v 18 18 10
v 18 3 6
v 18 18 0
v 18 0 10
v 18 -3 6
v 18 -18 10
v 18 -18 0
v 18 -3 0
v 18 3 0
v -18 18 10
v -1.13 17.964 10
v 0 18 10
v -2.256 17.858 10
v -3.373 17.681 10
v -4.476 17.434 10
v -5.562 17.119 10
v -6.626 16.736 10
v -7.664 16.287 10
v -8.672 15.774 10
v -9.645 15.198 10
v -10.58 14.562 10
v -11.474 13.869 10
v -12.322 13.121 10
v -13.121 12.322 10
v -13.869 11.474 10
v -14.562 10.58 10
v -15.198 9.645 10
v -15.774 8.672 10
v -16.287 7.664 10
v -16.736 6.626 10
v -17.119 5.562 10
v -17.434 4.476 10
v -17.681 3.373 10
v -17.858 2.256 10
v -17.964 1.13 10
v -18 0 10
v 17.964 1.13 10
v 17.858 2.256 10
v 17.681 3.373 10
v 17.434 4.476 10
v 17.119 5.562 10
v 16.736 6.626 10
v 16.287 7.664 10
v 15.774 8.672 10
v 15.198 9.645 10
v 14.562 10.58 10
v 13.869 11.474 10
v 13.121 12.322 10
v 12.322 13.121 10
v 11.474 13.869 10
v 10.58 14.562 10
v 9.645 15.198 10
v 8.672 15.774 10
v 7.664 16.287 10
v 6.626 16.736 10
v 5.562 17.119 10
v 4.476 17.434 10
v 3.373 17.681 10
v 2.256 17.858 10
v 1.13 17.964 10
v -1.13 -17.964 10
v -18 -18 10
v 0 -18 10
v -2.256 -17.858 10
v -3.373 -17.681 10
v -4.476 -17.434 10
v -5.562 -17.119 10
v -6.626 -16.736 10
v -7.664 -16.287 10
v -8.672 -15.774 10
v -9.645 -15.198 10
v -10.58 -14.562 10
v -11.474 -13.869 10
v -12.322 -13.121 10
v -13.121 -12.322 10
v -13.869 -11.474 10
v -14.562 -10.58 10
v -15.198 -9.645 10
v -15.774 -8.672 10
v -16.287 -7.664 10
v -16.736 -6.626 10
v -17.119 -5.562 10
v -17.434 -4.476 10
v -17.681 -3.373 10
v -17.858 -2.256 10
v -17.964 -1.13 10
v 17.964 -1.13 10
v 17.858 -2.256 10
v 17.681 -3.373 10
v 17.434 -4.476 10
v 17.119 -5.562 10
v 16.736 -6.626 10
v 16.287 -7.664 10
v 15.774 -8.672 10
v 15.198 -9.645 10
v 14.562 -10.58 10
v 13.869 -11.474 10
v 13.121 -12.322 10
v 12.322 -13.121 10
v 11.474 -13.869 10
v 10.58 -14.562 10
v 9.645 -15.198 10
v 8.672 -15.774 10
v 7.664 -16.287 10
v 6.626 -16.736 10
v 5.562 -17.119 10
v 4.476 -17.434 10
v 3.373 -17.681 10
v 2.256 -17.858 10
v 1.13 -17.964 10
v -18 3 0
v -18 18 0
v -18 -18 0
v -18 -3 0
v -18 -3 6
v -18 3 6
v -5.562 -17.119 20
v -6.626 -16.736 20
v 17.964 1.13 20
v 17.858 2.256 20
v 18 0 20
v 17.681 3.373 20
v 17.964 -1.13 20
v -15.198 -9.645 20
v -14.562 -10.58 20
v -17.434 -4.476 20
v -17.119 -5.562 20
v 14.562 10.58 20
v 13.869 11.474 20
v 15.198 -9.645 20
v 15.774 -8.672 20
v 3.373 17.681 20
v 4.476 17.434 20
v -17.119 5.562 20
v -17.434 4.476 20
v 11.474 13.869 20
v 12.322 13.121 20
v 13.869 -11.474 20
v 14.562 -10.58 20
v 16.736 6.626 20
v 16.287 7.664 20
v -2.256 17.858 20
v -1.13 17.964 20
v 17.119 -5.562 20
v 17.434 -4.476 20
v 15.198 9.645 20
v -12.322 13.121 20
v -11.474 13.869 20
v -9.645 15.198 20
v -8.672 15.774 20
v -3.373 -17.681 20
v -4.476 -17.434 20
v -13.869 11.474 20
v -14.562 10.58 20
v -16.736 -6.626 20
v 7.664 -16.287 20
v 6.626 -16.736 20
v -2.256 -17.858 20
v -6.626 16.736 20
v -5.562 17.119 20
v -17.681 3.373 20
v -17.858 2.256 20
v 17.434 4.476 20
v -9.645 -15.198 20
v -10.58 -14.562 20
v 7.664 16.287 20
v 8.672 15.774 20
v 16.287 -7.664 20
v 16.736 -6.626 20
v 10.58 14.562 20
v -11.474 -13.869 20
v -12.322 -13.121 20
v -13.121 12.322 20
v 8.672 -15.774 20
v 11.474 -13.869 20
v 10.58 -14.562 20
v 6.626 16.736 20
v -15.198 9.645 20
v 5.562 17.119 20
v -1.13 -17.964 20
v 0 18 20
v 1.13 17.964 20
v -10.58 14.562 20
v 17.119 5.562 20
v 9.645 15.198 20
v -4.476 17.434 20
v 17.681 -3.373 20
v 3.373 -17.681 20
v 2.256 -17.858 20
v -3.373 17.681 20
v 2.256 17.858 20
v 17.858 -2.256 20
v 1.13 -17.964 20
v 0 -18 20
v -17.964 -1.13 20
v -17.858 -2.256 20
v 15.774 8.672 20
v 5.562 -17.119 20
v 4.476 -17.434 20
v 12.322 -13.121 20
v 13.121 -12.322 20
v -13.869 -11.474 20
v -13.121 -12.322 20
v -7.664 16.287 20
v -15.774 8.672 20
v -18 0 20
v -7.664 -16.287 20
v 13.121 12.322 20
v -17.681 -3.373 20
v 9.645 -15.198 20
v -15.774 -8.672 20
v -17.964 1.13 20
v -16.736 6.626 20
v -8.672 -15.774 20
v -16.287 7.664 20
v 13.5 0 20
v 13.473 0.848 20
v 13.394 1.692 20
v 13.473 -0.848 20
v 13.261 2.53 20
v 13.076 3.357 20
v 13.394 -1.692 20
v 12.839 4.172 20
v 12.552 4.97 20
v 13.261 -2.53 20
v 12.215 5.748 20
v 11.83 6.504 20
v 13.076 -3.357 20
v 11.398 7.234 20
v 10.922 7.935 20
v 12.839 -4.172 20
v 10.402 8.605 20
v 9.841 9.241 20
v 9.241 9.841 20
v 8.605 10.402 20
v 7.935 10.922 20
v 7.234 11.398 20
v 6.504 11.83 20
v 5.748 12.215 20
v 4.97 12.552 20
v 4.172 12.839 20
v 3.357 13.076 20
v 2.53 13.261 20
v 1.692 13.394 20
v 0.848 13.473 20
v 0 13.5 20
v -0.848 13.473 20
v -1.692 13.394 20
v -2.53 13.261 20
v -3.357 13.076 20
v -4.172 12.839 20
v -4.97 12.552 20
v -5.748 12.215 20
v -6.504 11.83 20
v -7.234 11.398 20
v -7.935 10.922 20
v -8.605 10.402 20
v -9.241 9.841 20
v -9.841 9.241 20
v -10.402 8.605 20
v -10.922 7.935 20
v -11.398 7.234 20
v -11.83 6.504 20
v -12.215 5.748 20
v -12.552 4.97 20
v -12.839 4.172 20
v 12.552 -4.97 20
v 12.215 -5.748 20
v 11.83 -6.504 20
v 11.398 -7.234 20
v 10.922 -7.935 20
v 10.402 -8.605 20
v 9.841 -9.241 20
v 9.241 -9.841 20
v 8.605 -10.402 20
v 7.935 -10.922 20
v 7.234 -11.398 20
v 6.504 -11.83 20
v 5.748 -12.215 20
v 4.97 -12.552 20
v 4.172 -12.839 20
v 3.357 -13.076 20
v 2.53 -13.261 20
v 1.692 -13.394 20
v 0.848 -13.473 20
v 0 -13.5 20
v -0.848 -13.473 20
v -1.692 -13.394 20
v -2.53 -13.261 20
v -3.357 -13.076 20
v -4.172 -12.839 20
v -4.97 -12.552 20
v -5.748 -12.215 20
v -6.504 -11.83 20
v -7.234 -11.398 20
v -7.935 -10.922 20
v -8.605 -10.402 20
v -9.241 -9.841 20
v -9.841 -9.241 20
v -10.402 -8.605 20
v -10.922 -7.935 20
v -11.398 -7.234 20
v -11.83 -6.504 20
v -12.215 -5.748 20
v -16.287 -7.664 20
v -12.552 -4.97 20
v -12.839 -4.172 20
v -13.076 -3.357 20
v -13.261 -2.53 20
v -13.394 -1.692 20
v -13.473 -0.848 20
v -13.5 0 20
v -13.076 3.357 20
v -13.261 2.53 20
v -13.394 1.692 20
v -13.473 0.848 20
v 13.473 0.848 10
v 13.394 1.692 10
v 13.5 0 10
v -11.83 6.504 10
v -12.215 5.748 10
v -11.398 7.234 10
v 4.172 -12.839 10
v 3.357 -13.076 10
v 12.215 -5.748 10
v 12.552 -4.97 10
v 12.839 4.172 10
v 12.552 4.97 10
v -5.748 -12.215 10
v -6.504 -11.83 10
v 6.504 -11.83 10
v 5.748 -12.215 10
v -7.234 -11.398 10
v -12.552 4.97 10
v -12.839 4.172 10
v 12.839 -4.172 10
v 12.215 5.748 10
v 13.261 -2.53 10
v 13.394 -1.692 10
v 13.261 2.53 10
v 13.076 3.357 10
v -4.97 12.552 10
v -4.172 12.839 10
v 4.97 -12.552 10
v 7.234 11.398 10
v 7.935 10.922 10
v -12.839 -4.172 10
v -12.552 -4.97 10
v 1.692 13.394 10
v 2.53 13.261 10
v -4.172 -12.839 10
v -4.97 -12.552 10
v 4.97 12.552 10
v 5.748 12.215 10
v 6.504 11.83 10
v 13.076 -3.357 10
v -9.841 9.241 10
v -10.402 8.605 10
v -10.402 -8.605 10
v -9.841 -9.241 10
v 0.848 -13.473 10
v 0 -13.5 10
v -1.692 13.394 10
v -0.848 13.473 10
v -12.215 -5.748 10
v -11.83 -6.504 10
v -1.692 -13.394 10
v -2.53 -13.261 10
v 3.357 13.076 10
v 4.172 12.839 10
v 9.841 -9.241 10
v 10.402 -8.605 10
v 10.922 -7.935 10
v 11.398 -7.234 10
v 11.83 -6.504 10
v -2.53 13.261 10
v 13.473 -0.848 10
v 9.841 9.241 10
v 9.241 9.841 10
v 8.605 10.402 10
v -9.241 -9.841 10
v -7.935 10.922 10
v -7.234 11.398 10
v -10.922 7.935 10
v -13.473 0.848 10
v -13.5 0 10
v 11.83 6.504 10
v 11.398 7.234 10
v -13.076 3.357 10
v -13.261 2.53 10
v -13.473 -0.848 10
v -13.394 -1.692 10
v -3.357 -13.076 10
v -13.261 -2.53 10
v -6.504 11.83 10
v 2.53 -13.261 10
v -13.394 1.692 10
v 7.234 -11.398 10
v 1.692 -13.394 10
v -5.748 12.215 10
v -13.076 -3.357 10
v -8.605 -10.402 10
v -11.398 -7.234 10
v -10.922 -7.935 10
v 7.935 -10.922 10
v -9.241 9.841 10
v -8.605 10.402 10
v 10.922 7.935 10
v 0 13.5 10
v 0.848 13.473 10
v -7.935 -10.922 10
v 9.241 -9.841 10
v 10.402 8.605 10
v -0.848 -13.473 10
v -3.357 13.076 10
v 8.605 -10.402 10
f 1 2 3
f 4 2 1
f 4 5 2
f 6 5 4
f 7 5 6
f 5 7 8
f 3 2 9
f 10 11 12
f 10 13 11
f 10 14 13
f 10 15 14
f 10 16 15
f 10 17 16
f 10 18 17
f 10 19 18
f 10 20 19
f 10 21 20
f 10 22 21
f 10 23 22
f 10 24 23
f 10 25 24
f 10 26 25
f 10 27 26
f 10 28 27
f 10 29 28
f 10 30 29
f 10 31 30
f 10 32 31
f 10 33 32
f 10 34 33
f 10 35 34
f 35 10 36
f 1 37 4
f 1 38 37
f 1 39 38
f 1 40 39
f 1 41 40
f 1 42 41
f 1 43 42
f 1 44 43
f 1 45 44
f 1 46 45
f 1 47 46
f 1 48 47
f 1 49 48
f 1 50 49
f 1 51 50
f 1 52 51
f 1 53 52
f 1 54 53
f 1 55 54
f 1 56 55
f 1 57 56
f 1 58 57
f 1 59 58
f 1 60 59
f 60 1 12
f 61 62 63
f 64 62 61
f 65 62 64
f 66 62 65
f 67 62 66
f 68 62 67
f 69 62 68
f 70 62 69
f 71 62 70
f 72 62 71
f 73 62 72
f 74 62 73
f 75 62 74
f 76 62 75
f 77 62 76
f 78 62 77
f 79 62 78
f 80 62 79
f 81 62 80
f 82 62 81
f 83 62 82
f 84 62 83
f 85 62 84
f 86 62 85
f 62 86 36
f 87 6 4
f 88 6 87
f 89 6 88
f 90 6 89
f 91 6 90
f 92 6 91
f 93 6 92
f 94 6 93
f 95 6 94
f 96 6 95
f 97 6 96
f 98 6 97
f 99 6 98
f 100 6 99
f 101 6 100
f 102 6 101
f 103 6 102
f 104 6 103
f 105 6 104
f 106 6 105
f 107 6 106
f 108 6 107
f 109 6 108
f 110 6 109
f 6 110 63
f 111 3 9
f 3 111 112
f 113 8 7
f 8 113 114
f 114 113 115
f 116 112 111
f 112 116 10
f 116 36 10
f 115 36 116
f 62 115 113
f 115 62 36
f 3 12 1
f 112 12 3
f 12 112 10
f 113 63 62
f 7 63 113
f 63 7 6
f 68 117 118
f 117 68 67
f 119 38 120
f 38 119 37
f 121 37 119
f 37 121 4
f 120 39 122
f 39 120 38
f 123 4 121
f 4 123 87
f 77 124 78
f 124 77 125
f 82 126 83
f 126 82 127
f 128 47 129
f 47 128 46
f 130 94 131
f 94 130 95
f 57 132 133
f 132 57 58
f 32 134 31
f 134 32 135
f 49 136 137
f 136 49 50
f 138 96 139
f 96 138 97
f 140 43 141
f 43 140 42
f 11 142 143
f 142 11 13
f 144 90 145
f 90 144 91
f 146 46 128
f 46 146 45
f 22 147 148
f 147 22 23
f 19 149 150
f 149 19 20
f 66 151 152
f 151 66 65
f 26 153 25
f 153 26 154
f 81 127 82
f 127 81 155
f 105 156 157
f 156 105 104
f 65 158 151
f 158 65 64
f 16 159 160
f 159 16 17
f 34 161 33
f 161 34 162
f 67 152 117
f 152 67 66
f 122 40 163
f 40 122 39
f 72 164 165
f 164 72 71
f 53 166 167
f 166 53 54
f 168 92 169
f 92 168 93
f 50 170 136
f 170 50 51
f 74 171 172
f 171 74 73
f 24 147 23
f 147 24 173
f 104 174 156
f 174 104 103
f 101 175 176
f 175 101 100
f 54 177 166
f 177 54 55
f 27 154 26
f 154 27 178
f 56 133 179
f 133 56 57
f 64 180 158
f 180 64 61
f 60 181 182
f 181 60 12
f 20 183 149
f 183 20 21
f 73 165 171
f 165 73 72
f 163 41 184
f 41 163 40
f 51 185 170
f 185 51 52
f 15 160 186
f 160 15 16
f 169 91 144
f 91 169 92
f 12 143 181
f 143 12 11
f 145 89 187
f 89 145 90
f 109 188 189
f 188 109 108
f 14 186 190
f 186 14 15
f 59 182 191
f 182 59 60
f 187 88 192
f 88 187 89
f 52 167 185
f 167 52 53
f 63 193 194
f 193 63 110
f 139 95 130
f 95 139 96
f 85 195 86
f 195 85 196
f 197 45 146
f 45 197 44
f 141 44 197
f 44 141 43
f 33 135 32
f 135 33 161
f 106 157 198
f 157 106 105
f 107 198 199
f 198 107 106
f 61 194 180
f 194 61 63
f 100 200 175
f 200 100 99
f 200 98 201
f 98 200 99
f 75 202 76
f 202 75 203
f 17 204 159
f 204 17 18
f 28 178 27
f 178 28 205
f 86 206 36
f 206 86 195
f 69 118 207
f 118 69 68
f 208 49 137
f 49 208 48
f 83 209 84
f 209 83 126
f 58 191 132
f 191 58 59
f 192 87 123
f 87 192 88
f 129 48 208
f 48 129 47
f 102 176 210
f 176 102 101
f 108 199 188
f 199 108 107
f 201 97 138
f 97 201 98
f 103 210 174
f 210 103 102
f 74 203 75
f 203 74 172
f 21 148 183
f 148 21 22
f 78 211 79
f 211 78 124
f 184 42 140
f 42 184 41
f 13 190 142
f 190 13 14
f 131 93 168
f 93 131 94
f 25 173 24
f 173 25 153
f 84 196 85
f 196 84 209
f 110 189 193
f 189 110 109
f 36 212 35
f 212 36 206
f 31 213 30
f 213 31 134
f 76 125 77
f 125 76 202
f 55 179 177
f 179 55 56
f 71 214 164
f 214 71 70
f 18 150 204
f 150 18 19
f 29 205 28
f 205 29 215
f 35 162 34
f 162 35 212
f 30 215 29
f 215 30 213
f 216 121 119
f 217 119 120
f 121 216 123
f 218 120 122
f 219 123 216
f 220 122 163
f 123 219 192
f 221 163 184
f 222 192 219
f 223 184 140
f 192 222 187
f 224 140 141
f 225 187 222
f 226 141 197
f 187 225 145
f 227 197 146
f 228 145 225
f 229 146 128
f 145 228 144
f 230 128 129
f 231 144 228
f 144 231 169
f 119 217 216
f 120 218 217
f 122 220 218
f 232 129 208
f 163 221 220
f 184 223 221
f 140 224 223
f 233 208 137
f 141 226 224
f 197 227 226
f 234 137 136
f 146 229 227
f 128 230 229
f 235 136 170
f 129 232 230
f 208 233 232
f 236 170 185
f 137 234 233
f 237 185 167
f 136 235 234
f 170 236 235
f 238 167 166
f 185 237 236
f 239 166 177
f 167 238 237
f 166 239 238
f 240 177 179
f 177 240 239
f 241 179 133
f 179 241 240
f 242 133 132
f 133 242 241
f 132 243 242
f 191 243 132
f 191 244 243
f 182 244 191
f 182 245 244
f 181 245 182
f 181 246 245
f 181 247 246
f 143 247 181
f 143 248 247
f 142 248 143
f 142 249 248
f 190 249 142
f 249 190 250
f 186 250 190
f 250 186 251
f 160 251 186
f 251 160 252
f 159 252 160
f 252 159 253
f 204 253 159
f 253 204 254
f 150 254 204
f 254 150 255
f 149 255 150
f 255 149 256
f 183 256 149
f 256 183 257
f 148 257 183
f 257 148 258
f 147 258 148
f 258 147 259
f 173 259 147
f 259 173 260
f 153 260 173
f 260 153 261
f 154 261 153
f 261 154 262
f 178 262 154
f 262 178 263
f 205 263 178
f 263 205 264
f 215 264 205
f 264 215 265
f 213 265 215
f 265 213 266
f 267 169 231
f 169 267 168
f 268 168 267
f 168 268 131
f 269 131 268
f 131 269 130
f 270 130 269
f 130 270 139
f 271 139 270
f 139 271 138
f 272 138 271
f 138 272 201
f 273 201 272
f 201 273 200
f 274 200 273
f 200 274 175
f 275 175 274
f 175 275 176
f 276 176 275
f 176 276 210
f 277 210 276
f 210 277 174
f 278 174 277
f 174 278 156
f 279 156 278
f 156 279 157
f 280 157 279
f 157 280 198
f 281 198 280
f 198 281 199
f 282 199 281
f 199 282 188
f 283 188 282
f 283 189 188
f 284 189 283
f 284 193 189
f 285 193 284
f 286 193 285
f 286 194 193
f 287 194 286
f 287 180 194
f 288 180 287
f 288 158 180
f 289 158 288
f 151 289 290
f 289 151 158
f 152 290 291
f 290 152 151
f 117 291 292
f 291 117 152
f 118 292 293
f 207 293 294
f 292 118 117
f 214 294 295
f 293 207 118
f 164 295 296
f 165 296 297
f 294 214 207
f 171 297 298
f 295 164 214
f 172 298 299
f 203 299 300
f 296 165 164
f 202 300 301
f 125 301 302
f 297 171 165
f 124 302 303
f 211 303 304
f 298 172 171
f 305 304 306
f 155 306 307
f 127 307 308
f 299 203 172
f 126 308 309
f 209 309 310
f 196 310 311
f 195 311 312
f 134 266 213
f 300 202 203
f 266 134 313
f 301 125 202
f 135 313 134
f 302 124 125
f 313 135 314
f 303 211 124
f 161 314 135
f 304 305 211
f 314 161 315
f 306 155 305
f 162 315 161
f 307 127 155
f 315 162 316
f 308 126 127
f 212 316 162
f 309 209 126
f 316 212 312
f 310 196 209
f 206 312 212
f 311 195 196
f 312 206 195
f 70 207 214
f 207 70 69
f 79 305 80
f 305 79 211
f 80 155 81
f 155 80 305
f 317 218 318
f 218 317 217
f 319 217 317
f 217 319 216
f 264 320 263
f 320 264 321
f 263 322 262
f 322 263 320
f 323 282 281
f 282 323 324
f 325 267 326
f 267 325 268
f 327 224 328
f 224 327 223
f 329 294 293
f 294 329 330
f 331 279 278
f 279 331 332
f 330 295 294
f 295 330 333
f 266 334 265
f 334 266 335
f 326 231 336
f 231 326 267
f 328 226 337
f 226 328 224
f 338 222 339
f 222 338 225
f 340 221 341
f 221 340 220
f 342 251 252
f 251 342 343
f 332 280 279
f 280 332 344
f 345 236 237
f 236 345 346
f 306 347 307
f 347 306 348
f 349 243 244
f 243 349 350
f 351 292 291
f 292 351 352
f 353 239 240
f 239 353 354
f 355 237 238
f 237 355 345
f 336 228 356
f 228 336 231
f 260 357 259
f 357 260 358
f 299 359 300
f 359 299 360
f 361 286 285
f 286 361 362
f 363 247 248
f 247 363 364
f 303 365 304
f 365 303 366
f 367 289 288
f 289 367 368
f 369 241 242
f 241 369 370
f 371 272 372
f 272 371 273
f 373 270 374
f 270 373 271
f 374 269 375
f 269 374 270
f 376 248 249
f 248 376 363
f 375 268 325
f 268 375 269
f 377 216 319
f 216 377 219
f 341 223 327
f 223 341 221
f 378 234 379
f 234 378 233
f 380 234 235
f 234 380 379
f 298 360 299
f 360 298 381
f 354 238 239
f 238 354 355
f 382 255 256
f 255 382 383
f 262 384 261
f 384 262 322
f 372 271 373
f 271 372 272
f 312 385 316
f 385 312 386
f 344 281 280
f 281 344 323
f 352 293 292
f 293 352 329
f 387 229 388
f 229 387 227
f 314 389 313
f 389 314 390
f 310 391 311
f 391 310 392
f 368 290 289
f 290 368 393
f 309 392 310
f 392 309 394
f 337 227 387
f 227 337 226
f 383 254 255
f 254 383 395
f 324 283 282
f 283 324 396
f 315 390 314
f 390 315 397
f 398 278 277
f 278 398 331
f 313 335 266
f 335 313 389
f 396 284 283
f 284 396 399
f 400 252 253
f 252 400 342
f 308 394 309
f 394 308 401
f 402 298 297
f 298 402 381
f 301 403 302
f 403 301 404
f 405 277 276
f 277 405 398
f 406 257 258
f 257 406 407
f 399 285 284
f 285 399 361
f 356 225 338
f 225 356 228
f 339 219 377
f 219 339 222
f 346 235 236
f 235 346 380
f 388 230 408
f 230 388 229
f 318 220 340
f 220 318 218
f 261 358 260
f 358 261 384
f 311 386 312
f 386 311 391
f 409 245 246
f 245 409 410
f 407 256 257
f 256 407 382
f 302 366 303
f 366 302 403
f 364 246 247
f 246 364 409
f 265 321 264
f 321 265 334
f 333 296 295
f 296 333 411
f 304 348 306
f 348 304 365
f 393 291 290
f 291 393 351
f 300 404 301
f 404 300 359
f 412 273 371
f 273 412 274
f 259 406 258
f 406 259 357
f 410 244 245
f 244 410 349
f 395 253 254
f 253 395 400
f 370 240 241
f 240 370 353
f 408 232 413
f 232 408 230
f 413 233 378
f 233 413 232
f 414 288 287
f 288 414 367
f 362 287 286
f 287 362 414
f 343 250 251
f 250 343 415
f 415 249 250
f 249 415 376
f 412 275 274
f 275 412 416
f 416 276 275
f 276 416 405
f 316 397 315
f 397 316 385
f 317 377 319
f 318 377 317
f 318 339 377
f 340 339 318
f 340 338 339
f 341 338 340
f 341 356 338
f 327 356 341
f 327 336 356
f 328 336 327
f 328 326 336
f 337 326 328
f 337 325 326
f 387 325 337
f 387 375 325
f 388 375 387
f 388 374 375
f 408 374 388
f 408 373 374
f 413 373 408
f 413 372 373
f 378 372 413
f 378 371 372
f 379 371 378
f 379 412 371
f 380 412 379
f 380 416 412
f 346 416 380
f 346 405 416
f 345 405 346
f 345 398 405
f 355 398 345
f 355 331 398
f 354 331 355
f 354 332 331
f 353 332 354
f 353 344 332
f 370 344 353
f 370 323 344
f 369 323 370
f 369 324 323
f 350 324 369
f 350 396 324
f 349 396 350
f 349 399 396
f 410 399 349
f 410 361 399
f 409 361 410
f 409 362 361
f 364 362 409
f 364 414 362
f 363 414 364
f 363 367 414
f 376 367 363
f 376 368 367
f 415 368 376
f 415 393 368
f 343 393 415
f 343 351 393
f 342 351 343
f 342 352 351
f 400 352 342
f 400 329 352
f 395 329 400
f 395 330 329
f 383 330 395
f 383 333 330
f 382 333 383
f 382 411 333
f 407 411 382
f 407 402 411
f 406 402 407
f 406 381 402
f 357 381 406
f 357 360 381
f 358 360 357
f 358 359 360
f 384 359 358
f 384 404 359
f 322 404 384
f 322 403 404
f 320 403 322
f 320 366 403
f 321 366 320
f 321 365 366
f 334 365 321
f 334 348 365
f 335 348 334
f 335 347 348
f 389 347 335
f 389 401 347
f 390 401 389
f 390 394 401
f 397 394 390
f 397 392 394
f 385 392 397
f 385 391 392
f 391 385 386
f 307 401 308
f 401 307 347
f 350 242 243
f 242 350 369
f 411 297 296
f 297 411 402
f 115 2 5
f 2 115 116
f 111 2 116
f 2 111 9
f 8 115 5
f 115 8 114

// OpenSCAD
//Geophone support RTC 10Hz

//Dimensions-------------------------------------------------
//All in mm

// Geophone dimensions
hg=34;   //height
dg=27;  //diameter 

// support
bases=36;
hs=10;
w=9;
e=10;
hc=20;

//holes
dh=3;
th=27;

//groove
gw=6;
gd=12;
gdd=3;
//--------------------------------------------------------------
$fn=100;//resolution

module Make_body() {
difference(){
union(){
translate([0,0,hs/2]) cube([bases,bases,hs],center=true);
translate([0,0,hc/2]) cylinder(h=hc,d=dg+9,center=true);
}
translate([0,0,e+hg/2]) cylinder(h=hg,d=dg,center=true);
}
}
module Make_holes() {
union(){
rotate([0,0,45])translate([th,0,0]) cylinder(h=3*hs,d=dh,center=true);
rotate([0,0,135])translate([th,0,0]) cylinder(h=3*hs,d=dh,center=true);
rotate([0,0,225])translate([th,0,0]) cylinder(h=3*hs,d=dh,center=true);
rotate([0,0,315])translate([th,0,0]) cylinder(h=3*hs,d=dh,center=true);
}}

module Make_groove() {
    union(){
    cube([100,gw,gd],center=true);
    //rotate([0,0,90]) cube([100,gw,gd],center=true);
}}

module Make_groove_holes(){
   union(){
    translate([(gdd+bases)/2-7.5,0,0])rotate([0,90,0])cube([100,gw,gdd],center=true);
    translate([-(gdd+bases)/2+7.5,0,0])rotate([0,90,0])cube([100,gw,gdd],center=true);
}}



difference(){
Make_body();
Make_groove();
}


/*
color( "green", 1.0 ) {
translate([0,0,e+hg/2]) cylinder(h=hg,d=dg,center=true);
}
*/
